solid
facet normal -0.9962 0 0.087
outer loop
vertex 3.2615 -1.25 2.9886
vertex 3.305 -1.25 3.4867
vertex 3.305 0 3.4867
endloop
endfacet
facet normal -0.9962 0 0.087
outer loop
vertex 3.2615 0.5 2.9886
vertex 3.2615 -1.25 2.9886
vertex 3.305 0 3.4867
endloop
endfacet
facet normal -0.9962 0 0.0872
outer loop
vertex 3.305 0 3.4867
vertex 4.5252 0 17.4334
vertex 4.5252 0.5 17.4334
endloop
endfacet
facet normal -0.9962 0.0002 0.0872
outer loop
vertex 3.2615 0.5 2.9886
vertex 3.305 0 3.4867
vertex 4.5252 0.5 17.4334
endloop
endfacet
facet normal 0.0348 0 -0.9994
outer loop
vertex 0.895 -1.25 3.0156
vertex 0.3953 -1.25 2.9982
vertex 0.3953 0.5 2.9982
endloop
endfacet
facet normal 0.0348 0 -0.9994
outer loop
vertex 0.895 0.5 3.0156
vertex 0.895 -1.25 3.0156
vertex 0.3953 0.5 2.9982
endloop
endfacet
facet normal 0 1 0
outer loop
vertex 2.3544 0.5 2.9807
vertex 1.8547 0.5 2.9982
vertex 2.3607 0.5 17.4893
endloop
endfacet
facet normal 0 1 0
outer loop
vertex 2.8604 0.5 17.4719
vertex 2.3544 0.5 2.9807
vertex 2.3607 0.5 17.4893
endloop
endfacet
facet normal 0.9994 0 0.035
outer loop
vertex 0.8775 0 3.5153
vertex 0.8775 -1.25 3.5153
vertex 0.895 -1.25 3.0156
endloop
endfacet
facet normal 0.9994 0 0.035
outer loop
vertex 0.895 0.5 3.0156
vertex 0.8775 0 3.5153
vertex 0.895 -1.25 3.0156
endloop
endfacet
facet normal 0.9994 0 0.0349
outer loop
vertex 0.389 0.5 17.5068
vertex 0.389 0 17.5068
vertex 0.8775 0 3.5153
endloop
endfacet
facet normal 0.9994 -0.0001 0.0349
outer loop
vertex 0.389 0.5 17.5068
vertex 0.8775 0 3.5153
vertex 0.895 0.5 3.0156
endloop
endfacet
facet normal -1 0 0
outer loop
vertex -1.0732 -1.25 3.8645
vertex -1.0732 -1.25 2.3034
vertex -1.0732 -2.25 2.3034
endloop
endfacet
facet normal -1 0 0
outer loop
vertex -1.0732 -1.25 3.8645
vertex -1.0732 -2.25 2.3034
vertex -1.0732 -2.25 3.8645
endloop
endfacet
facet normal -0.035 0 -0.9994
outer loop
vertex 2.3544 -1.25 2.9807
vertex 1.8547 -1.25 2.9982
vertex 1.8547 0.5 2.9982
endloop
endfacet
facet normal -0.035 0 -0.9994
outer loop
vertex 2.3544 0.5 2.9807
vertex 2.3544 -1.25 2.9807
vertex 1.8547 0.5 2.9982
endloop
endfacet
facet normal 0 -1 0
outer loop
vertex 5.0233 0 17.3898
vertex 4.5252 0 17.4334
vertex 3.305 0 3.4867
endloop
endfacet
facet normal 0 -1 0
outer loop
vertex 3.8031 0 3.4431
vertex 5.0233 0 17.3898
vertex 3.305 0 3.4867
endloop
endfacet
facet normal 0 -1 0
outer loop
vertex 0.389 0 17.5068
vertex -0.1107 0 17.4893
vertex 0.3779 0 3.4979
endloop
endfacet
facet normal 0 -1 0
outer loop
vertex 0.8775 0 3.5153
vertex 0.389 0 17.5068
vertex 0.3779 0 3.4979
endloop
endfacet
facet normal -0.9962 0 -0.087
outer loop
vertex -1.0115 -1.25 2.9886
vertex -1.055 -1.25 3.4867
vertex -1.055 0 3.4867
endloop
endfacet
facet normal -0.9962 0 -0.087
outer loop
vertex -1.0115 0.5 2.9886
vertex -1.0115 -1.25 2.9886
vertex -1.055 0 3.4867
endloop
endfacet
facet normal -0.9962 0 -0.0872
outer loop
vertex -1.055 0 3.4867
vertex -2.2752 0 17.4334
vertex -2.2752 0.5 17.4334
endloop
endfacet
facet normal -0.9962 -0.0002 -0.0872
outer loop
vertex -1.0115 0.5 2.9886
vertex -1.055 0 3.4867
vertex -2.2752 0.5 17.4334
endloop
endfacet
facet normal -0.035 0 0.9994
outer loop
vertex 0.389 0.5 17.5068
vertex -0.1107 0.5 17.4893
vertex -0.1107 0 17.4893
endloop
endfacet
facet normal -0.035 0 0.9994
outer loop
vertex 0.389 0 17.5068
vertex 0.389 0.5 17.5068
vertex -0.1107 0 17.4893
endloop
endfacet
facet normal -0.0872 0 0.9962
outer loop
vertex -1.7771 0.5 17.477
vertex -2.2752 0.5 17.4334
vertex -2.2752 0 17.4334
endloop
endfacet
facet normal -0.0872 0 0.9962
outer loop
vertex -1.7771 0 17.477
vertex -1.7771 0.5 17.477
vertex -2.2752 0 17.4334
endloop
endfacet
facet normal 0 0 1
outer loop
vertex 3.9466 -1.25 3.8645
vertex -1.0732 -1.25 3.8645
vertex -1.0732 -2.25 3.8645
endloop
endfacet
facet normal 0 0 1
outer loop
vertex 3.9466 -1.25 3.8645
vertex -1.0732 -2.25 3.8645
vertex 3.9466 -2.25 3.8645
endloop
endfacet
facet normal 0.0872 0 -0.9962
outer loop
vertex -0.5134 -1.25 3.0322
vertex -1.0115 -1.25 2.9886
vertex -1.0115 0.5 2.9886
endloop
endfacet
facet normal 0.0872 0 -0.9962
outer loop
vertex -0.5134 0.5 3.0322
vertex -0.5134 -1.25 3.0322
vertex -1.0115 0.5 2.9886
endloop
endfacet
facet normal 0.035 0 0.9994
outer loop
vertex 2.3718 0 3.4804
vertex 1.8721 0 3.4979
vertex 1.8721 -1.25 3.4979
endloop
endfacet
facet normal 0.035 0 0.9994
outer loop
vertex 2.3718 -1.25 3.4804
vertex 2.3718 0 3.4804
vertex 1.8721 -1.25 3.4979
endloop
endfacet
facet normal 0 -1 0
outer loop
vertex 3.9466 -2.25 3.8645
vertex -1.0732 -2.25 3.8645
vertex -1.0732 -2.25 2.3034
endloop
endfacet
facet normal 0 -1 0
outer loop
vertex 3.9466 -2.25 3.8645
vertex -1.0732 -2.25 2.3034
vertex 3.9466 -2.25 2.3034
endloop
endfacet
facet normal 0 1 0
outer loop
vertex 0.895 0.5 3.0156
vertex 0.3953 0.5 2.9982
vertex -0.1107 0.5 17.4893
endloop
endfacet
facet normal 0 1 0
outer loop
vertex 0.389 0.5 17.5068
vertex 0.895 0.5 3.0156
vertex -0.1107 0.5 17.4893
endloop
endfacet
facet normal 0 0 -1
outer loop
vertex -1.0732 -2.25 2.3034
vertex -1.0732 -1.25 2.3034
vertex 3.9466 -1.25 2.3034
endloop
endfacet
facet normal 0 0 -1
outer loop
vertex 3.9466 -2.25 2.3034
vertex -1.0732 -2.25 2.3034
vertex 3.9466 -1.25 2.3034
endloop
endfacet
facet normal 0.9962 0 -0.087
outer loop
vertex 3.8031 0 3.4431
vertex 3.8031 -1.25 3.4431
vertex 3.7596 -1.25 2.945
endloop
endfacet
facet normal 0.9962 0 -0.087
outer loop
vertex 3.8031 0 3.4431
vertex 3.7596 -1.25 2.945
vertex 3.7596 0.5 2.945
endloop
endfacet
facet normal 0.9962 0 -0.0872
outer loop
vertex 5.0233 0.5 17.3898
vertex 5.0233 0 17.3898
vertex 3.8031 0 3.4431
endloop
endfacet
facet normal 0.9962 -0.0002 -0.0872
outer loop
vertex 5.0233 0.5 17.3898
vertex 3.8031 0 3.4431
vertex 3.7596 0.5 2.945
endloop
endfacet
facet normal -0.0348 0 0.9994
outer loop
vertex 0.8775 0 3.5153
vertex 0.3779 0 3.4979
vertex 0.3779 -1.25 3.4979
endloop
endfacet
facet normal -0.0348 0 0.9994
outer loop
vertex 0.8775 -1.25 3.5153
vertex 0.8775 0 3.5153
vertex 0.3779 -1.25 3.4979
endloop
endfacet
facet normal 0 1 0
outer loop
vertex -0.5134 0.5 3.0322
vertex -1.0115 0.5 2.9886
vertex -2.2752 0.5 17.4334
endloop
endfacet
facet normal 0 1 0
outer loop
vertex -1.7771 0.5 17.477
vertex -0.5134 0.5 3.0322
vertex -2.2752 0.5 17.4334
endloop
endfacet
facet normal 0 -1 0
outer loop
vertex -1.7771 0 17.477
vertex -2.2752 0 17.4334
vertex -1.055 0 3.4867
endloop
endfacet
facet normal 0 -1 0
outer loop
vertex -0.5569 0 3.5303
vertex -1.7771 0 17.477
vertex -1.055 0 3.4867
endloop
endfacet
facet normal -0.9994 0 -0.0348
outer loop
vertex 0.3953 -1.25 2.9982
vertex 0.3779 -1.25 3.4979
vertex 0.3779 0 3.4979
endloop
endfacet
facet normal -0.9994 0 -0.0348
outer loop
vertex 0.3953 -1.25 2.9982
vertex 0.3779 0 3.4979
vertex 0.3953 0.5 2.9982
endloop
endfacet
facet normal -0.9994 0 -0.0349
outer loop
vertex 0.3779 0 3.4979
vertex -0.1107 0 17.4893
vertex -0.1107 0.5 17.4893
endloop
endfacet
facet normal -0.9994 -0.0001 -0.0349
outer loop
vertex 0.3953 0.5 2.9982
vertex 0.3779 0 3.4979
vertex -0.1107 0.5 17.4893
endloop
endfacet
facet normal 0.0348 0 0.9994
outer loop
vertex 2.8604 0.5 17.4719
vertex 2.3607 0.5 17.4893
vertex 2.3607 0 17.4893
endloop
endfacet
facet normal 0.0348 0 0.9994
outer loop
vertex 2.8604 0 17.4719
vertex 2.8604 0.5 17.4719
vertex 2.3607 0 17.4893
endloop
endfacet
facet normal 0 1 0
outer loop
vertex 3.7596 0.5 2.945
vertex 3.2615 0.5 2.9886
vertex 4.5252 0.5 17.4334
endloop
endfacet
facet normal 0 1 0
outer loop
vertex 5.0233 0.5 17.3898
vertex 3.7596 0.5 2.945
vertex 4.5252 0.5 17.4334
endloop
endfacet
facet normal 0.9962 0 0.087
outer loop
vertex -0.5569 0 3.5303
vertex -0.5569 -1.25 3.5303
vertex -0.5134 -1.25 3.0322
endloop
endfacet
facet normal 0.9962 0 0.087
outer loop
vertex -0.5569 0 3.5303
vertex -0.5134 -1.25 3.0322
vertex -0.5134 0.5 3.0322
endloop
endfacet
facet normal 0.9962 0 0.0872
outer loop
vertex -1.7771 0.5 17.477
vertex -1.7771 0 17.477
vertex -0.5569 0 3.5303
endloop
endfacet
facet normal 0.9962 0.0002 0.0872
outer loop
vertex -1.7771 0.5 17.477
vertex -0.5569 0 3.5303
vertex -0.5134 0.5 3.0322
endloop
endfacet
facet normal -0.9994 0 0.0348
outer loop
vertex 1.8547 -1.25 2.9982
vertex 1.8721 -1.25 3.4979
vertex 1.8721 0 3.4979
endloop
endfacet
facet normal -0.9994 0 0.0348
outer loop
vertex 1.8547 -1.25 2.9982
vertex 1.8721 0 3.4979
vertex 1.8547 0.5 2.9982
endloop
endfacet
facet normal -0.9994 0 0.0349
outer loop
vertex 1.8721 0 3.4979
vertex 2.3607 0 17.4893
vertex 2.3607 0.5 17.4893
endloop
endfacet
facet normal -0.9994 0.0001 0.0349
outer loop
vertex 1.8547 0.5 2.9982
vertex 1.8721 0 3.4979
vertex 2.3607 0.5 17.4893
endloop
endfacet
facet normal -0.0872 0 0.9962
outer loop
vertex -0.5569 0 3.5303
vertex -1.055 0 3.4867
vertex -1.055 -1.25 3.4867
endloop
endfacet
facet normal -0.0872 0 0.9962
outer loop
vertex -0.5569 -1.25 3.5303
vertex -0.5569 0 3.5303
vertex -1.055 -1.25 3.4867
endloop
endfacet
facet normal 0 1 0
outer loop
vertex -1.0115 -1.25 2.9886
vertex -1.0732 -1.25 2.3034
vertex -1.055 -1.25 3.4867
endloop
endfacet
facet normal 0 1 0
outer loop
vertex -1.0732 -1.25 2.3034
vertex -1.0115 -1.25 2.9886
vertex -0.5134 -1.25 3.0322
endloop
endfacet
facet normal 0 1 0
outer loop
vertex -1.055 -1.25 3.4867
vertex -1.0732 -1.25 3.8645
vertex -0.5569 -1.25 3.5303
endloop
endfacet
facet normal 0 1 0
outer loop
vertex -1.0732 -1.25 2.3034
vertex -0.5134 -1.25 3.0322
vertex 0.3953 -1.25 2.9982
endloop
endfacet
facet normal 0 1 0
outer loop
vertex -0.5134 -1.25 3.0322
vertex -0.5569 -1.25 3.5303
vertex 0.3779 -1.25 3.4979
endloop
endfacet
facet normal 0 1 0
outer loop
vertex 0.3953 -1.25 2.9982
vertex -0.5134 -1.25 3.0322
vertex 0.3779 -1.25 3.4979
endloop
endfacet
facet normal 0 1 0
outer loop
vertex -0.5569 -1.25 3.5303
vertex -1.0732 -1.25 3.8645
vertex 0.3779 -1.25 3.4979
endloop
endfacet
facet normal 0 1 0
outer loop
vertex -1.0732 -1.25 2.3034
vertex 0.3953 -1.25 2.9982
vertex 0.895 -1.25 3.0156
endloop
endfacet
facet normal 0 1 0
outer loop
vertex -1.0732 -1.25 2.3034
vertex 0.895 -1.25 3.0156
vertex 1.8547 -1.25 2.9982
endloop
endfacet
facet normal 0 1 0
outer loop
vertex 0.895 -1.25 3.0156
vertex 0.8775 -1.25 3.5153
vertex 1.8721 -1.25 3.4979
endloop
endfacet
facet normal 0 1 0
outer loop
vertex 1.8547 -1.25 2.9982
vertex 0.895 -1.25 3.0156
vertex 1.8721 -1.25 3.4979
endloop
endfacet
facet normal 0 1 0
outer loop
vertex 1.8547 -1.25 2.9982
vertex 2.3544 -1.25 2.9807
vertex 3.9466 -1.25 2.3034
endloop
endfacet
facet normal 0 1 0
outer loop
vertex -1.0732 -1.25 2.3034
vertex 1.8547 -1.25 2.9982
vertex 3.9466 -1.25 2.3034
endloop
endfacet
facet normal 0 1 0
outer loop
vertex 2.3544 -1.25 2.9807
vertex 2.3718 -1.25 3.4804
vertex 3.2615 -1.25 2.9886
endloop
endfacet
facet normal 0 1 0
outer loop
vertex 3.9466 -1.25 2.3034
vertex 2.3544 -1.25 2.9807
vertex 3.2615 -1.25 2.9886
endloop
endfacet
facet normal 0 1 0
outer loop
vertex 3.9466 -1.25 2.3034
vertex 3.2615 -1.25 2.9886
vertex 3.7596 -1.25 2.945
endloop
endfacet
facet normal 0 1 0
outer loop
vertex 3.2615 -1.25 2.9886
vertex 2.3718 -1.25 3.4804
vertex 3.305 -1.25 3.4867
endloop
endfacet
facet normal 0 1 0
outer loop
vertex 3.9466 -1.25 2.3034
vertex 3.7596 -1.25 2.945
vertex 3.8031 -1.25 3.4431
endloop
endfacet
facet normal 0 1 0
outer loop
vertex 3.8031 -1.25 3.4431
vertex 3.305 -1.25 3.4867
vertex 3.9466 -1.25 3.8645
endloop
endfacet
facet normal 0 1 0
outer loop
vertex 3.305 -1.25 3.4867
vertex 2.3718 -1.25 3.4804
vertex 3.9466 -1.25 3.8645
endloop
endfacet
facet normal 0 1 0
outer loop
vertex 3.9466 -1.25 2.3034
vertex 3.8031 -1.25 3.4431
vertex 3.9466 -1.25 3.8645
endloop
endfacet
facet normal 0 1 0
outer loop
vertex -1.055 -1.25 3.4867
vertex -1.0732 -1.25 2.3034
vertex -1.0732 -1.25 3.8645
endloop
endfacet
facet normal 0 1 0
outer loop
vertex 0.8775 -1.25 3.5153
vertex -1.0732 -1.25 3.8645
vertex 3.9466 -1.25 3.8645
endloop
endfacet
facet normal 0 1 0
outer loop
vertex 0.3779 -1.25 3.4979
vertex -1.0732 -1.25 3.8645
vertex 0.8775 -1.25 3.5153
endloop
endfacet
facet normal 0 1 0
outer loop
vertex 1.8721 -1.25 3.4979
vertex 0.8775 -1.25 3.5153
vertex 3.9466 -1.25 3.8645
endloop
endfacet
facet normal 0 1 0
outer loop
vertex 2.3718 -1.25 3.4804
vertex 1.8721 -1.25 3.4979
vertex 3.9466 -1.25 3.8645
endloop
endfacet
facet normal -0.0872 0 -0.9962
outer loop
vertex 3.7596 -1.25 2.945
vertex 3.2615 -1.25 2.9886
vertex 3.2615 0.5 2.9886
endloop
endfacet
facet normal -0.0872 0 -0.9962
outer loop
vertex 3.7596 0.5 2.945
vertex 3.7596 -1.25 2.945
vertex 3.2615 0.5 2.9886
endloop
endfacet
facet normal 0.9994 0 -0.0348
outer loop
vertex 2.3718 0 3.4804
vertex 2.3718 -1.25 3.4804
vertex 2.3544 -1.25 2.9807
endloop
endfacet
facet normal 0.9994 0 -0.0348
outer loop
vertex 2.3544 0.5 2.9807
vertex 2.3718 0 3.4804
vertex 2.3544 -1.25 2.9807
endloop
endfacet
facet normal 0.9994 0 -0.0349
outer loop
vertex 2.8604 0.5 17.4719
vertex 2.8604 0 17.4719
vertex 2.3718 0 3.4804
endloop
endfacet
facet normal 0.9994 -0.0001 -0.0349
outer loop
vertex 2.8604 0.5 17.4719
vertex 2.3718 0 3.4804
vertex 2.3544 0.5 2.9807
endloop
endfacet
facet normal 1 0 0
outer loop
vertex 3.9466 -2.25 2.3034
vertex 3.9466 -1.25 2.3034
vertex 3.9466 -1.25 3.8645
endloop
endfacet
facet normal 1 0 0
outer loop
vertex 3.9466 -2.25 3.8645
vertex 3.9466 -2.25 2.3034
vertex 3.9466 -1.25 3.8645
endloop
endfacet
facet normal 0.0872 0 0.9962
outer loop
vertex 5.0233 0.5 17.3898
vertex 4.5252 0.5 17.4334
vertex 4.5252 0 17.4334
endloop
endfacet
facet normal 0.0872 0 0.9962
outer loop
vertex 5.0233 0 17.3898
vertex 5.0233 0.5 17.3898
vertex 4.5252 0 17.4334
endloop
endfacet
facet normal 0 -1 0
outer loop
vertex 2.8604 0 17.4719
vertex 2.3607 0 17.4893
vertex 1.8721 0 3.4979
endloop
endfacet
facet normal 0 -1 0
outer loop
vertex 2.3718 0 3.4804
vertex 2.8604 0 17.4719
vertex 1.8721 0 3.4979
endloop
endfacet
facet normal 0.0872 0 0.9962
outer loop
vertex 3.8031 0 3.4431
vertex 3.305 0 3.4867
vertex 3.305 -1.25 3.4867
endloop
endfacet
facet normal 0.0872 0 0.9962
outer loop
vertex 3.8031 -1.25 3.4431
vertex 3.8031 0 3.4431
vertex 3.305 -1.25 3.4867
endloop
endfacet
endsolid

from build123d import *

# Parameters (mm, degrees)
SKETCH009_W  = 5.019769
SKETCH009_H  = 1.561025
PAD007_DEPTH = 1
PAD005_DEPTH = 0.5
PAD006_DEPTH = 0.5
PAD008_DEPTH = 0.5
PAD009_DEPTH = 0.5


with BuildPart() as part:
    # Sketch009 → Pad007 (new body)
    with BuildSketch(Plane.XZ.offset(1.25)):
        with Locations((1.436677, 3.083954)):
            Rectangle(SKETCH009_W, SKETCH009_H)
    extrude(amount=PAD007_DEPTH)

    # Sketch005 → Pad005 (join)
    with BuildSketch(Plane(origin=(-0.75, 0, 0), x_dir=(0, 1, 0), z_dir=(0.996195, 0, 0.087156))):
        Polygon((-1.5, 3), (0.5, 3), (0.5, 17.5), (0, 17.5), (0, 3.5), (-1.5, 3.5), align=None)
    extrude(amount=PAD005_DEPTH)

    # Sketch006 → Pad006 (join)
    with BuildSketch(Plane(origin=(0.5, 0, 0), x_dir=(0, 1, 0), z_dir=(0.999391, 0, 0.034899))):
        Polygon((-1.5, 3), (0.5, 3), (0.5, 17.5), (0, 17.5), (0, 3.5), (-1.5, 3.5), align=None)
    extrude(amount=PAD006_DEPTH)

    # Sketch007 → Pad008 (join)
    with BuildSketch(Plane(origin=(1.75, 0, 0), x_dir=(0, 1, 0), z_dir=(0.999391, 0, -0.034899))):
        Polygon((-1.5, 3), (0.5, 3), (0.5, 17.5), (0, 17.5), (0, 3.5), (-1.5, 3.5), align=None)
    extrude(amount=PAD008_DEPTH)

    # Sketch008 → Pad009 (join)
    with BuildSketch(Plane(origin=(3, 0, 0), x_dir=(0, 1, 0), z_dir=(0.996195, 0, -0.087156))):
        Polygon((-1.5, 3), (0.5, 3), (0.5, 17.5), (0, 17.5), (0, 3.5), (-1.5, 3.5), align=None)
    extrude(amount=PAD009_DEPTH)


solid = part.part
